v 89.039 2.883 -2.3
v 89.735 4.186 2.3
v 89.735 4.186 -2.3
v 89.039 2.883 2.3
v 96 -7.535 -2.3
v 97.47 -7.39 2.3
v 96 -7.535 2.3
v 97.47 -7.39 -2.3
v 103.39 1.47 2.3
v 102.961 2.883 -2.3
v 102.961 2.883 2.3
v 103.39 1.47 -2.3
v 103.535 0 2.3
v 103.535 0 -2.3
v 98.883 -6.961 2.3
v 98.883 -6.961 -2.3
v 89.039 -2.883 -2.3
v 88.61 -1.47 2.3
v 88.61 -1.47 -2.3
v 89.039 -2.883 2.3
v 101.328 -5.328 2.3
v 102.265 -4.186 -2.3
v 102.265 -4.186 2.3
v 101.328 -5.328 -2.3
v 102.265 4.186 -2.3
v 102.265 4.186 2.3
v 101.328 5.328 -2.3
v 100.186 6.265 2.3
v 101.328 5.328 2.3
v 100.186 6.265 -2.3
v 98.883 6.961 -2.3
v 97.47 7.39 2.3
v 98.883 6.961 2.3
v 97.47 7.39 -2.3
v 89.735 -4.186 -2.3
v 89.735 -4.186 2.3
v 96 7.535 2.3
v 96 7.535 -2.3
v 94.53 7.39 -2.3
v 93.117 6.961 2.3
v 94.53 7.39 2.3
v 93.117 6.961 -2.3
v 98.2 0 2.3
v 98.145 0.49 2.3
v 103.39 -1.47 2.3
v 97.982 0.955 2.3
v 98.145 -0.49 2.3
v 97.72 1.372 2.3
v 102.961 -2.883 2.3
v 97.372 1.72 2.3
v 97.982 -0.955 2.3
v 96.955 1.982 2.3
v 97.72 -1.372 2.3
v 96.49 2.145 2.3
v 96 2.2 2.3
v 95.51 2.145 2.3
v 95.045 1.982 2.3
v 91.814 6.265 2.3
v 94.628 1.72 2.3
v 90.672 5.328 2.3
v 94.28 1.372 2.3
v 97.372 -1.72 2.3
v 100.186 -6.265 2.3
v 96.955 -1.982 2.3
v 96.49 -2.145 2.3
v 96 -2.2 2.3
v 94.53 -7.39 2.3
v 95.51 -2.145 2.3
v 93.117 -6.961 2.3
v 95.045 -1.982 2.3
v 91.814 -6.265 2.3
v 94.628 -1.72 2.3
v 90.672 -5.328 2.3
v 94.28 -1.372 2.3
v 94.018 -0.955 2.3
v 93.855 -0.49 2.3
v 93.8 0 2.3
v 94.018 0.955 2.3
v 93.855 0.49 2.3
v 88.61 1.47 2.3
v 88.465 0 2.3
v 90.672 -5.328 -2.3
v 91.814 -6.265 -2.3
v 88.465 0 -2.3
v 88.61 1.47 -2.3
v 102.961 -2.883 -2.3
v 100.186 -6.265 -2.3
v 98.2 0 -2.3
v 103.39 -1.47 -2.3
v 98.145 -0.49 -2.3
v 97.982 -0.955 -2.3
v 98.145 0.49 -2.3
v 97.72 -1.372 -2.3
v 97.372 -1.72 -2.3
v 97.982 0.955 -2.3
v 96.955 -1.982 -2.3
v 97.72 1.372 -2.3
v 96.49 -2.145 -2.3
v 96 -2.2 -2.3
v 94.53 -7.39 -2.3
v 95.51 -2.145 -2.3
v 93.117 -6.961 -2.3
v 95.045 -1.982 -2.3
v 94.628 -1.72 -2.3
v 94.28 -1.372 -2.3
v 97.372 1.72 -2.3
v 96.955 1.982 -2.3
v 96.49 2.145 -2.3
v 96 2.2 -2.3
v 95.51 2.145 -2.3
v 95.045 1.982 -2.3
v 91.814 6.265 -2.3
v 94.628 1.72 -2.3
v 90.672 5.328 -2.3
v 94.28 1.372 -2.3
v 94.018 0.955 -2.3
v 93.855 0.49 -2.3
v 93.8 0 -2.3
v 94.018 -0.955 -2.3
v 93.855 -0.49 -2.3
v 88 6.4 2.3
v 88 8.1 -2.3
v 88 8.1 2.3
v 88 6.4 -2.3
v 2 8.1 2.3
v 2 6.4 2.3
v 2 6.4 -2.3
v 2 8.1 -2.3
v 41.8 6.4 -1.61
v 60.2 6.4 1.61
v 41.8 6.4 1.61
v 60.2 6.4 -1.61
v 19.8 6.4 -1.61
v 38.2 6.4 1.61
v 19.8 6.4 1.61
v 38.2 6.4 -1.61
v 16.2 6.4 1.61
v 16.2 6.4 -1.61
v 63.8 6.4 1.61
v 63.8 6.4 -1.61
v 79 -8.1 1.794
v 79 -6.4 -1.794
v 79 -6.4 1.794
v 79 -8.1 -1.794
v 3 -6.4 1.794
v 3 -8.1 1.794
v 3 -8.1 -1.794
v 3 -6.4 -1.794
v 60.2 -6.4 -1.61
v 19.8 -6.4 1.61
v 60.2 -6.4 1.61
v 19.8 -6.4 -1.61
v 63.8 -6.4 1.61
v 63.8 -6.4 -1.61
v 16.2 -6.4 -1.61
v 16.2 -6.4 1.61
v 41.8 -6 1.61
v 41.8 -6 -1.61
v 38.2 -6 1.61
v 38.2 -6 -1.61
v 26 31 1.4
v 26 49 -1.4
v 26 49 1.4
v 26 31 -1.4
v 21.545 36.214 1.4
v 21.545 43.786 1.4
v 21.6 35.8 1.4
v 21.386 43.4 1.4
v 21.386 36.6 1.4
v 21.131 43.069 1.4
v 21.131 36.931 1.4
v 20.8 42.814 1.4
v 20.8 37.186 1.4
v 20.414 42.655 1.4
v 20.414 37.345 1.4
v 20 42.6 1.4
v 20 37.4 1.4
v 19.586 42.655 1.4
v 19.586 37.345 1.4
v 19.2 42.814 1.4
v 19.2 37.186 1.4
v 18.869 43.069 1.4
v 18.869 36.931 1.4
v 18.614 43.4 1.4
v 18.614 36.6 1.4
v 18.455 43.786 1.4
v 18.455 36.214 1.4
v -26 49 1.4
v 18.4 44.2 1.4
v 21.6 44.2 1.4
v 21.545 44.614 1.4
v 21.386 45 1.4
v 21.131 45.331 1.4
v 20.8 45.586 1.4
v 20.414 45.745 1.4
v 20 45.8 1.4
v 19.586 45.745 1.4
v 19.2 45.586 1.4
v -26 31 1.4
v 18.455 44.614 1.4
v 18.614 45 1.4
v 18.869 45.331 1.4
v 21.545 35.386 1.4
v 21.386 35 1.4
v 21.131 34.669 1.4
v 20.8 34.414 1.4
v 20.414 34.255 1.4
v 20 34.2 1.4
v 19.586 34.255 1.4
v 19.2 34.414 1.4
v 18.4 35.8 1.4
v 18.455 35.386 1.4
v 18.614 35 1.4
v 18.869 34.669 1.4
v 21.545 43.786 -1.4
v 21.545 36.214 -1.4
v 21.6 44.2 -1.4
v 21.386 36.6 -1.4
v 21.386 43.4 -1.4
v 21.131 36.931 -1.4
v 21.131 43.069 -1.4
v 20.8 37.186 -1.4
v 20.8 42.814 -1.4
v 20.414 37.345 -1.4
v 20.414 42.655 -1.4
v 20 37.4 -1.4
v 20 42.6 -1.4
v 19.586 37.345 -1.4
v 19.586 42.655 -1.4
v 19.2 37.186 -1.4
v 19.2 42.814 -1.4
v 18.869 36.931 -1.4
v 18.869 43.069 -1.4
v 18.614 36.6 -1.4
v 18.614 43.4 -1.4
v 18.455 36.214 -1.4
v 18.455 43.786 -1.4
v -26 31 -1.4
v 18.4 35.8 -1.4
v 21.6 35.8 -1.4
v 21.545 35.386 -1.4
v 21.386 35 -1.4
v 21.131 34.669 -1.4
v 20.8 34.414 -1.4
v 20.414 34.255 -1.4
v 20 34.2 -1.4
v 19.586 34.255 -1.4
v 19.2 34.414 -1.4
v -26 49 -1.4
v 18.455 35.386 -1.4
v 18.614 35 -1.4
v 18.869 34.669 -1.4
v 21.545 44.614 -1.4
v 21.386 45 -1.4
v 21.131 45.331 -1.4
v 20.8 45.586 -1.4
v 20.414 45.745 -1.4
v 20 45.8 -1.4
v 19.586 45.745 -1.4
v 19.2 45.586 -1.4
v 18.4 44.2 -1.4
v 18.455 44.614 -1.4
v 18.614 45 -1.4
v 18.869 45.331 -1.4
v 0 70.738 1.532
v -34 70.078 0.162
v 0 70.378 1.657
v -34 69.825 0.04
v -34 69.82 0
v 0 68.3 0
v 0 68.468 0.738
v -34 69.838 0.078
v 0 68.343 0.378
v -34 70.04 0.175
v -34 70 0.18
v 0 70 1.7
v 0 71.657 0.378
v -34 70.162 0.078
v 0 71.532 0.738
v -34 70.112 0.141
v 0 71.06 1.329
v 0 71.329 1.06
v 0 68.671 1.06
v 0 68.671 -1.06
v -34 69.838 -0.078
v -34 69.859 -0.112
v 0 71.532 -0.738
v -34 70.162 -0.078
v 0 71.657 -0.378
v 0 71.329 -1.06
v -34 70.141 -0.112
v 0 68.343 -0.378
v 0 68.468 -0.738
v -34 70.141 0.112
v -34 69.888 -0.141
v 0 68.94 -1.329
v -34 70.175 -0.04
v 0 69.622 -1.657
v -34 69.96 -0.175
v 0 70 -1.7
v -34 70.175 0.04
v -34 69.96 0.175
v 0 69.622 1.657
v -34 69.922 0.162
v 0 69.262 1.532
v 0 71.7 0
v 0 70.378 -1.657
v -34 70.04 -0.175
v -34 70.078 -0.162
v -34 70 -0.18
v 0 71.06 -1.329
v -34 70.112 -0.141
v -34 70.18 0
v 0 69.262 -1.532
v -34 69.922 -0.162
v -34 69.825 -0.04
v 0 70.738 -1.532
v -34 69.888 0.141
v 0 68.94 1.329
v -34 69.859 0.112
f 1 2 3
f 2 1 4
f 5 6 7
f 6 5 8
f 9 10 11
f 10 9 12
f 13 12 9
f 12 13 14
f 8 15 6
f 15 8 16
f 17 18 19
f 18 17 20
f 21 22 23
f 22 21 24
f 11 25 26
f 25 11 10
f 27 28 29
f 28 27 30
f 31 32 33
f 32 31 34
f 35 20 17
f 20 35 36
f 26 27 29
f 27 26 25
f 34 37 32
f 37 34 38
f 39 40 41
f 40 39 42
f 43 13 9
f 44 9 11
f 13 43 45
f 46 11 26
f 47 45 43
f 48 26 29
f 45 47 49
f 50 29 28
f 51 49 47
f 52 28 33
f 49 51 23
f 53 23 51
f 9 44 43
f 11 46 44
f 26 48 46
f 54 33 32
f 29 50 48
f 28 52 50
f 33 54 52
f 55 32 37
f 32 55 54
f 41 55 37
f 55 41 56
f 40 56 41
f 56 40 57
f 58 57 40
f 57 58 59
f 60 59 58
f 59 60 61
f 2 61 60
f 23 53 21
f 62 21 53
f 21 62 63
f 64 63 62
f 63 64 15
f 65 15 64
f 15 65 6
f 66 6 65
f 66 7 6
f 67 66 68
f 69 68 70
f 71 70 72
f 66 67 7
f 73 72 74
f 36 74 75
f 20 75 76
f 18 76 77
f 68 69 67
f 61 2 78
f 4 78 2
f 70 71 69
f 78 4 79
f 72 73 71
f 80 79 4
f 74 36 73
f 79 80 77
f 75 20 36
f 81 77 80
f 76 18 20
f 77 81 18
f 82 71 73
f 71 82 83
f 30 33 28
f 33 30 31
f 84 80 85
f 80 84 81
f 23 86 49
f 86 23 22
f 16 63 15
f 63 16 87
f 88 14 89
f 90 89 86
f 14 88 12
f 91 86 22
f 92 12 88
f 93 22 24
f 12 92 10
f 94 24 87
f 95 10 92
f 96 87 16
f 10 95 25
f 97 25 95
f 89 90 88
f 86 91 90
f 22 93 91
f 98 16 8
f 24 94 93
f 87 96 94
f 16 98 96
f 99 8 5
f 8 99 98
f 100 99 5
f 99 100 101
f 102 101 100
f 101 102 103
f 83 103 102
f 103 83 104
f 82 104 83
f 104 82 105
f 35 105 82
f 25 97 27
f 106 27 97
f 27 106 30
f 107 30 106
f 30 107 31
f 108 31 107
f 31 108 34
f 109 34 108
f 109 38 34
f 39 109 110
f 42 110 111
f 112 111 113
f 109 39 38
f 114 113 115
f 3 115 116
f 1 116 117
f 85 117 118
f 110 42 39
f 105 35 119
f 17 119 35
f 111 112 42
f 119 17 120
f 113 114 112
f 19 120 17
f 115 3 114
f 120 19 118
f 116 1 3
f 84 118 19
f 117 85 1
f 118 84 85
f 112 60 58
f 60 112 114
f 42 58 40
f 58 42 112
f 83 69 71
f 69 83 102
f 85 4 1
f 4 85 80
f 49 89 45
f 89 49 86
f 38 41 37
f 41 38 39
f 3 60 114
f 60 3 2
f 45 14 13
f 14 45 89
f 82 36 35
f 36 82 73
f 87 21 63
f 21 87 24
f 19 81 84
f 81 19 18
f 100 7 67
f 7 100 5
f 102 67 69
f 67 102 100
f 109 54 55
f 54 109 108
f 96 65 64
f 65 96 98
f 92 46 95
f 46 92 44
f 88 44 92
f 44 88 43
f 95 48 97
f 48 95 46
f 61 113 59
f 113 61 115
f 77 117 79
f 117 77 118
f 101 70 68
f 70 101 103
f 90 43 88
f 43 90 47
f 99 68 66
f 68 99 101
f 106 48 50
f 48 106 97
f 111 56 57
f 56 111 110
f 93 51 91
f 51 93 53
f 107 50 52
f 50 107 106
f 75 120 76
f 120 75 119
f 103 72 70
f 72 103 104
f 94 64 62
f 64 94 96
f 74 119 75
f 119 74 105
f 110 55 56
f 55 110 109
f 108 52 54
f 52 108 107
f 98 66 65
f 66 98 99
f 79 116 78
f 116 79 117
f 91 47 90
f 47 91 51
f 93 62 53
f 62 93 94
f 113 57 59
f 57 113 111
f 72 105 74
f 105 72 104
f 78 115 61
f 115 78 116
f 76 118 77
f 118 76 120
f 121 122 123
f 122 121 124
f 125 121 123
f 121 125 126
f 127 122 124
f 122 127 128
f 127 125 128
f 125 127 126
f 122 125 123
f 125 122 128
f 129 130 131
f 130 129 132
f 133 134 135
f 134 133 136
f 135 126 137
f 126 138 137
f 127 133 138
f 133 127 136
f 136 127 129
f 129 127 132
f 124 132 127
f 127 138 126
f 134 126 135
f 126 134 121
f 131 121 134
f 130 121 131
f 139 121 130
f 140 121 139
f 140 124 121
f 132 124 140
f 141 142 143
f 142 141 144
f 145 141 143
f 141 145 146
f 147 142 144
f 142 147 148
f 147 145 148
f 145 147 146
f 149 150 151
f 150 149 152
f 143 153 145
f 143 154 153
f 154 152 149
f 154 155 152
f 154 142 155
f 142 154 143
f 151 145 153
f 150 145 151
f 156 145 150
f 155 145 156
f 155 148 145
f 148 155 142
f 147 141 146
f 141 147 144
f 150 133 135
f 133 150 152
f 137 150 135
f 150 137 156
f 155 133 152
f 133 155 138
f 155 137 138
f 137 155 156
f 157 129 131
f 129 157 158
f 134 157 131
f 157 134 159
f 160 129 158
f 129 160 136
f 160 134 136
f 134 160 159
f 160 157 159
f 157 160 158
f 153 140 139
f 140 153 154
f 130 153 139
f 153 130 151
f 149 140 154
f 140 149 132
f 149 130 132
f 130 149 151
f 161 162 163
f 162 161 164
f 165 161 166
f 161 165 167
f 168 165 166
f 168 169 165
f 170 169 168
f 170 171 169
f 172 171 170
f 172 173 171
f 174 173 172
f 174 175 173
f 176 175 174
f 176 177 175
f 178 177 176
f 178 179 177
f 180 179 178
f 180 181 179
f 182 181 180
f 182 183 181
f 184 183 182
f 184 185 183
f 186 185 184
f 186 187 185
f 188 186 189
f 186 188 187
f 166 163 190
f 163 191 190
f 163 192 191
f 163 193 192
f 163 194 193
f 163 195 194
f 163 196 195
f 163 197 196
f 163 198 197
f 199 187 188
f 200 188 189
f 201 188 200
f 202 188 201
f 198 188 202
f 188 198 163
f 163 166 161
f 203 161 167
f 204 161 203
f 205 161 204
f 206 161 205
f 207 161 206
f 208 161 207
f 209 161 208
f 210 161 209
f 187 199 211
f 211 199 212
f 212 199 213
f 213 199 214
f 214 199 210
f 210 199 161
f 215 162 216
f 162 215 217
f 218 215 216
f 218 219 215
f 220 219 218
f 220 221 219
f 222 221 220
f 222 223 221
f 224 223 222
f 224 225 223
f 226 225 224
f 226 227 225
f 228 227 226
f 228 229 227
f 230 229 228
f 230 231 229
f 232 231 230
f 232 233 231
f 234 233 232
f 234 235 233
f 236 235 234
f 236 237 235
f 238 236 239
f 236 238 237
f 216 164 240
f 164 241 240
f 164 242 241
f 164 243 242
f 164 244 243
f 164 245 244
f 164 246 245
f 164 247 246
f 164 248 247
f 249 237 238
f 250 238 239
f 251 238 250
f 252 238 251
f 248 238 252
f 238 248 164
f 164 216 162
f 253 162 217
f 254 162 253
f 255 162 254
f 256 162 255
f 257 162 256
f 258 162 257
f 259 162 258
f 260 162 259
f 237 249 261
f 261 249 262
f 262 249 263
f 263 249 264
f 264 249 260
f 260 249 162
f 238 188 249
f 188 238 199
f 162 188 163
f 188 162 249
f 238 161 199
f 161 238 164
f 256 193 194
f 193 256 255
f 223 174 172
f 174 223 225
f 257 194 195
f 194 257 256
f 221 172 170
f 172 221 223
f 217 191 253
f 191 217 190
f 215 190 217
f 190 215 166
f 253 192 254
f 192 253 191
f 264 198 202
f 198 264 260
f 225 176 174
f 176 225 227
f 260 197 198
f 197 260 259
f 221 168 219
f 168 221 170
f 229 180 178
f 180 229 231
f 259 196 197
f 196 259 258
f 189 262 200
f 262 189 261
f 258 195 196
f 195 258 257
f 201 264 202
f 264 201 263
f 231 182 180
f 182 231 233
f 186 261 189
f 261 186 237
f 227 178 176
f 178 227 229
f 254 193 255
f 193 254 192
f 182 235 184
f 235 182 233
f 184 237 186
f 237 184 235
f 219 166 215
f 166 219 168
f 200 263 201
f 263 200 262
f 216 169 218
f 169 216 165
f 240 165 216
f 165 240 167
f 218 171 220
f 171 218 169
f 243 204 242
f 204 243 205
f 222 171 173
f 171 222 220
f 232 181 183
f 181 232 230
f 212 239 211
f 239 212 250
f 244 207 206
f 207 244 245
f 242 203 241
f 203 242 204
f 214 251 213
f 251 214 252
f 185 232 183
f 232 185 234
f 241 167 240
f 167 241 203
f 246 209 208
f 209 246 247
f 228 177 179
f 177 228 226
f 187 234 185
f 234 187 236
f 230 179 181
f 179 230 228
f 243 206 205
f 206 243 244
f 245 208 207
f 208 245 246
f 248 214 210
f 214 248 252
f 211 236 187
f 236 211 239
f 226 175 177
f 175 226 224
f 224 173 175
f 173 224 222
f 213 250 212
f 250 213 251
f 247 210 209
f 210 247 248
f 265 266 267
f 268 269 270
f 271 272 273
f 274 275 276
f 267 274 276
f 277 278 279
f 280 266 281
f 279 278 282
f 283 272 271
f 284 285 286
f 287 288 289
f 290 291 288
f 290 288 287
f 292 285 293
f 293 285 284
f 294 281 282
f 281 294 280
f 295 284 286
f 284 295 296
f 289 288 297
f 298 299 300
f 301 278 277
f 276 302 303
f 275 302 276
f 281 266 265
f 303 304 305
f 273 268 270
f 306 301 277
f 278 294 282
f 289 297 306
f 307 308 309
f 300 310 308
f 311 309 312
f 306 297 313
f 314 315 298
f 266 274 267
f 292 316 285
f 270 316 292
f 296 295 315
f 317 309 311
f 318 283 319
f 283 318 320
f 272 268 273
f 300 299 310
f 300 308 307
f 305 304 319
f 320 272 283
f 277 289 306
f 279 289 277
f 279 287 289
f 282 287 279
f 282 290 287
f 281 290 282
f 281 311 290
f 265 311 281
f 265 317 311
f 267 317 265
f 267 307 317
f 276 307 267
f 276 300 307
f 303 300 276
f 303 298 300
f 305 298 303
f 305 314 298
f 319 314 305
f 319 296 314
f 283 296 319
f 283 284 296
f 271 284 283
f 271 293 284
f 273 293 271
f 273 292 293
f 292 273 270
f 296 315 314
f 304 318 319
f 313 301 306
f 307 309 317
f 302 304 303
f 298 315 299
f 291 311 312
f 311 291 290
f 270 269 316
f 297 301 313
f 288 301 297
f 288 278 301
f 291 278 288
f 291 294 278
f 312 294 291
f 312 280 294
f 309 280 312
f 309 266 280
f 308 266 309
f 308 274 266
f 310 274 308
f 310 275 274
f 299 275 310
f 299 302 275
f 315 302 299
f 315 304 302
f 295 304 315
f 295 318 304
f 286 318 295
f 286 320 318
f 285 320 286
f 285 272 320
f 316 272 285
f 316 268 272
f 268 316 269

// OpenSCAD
// SHINOBI//82 KAGE — ledger notes (mm)
// Master solids are CadQuery B-rep: production/build_production.py → step/*.step
// This file is a readable parameter sketch, not the shop package.

frame_length = 94;
frame_height = 16.2;
frame_ridge = 4.6;
frame_rail = 1.7;
pommel_hole = 4.4;

mizu_blade = 82;
mizu_tang = 28;
mizu_heel_h = 15.2;
mizu_tip_h = 6.2;
mizu_heel_t = 1.55;
mizu_tip_t = 0.60;

kumiko_blade = 42;
kumiko_bevel = 15;

nata_blade = 60;
nata_bevel = 24;

saya_length = 92;
spike_point = 34;
togi_length = 52;
togi_width = 18;
togi_thick = 2.8;

module rail(size, pos) { translate(pos) cube(size, center=true); }

module frame() {
    rail([frame_length-8, frame_rail, frame_ridge], [frame_length/2-2, frame_height/2-frame_rail/2, 0]);
    rail([frame_length-18, frame_rail, frame_ridge*0.78], [frame_length/2-6, -frame_height/2+frame_rail/2, 0]);
    rail([3.6, frame_height-2.2, frame_ridge*0.7], [18, 0, 0]);
    rail([3.6, frame_height-3.4, frame_ridge*0.7], [40, 0.4, 0]);
    rail([3.6, frame_height-2.8, frame_ridge*0.7], [62, -0.2, 0]);
    difference() {
        translate([frame_length+2, 0, 0]) cylinder(h=frame_ridge, r=frame_height/2.15, center=true, $fn=32);
        translate([frame_length+2, 0, 0]) cylinder(h=frame_ridge+2, r=pommel_hole/2, center=true, $fn=28);
    }
}

module togi() {
    difference() {
        cube([togi_length, togi_width, togi_thick], center=true);
        translate([togi_length/2-6, 4.2, 0]) cylinder(h=togi_thick+2, r=1.6, center=true, $fn=24);
        translate([togi_length/2-6, -4.2, 0]) cylinder(h=togi_thick+2, r=1.6, center=true, $fn=24);
    }
}

module spike() {
    rotate([0, -90, 0]) cylinder(h=spike_point, r1=1.7, r2=0.18, $fn=28);
}

frame();
translate([0, 40, 0]) togi();
translate([0, 70, 0]) spike();
